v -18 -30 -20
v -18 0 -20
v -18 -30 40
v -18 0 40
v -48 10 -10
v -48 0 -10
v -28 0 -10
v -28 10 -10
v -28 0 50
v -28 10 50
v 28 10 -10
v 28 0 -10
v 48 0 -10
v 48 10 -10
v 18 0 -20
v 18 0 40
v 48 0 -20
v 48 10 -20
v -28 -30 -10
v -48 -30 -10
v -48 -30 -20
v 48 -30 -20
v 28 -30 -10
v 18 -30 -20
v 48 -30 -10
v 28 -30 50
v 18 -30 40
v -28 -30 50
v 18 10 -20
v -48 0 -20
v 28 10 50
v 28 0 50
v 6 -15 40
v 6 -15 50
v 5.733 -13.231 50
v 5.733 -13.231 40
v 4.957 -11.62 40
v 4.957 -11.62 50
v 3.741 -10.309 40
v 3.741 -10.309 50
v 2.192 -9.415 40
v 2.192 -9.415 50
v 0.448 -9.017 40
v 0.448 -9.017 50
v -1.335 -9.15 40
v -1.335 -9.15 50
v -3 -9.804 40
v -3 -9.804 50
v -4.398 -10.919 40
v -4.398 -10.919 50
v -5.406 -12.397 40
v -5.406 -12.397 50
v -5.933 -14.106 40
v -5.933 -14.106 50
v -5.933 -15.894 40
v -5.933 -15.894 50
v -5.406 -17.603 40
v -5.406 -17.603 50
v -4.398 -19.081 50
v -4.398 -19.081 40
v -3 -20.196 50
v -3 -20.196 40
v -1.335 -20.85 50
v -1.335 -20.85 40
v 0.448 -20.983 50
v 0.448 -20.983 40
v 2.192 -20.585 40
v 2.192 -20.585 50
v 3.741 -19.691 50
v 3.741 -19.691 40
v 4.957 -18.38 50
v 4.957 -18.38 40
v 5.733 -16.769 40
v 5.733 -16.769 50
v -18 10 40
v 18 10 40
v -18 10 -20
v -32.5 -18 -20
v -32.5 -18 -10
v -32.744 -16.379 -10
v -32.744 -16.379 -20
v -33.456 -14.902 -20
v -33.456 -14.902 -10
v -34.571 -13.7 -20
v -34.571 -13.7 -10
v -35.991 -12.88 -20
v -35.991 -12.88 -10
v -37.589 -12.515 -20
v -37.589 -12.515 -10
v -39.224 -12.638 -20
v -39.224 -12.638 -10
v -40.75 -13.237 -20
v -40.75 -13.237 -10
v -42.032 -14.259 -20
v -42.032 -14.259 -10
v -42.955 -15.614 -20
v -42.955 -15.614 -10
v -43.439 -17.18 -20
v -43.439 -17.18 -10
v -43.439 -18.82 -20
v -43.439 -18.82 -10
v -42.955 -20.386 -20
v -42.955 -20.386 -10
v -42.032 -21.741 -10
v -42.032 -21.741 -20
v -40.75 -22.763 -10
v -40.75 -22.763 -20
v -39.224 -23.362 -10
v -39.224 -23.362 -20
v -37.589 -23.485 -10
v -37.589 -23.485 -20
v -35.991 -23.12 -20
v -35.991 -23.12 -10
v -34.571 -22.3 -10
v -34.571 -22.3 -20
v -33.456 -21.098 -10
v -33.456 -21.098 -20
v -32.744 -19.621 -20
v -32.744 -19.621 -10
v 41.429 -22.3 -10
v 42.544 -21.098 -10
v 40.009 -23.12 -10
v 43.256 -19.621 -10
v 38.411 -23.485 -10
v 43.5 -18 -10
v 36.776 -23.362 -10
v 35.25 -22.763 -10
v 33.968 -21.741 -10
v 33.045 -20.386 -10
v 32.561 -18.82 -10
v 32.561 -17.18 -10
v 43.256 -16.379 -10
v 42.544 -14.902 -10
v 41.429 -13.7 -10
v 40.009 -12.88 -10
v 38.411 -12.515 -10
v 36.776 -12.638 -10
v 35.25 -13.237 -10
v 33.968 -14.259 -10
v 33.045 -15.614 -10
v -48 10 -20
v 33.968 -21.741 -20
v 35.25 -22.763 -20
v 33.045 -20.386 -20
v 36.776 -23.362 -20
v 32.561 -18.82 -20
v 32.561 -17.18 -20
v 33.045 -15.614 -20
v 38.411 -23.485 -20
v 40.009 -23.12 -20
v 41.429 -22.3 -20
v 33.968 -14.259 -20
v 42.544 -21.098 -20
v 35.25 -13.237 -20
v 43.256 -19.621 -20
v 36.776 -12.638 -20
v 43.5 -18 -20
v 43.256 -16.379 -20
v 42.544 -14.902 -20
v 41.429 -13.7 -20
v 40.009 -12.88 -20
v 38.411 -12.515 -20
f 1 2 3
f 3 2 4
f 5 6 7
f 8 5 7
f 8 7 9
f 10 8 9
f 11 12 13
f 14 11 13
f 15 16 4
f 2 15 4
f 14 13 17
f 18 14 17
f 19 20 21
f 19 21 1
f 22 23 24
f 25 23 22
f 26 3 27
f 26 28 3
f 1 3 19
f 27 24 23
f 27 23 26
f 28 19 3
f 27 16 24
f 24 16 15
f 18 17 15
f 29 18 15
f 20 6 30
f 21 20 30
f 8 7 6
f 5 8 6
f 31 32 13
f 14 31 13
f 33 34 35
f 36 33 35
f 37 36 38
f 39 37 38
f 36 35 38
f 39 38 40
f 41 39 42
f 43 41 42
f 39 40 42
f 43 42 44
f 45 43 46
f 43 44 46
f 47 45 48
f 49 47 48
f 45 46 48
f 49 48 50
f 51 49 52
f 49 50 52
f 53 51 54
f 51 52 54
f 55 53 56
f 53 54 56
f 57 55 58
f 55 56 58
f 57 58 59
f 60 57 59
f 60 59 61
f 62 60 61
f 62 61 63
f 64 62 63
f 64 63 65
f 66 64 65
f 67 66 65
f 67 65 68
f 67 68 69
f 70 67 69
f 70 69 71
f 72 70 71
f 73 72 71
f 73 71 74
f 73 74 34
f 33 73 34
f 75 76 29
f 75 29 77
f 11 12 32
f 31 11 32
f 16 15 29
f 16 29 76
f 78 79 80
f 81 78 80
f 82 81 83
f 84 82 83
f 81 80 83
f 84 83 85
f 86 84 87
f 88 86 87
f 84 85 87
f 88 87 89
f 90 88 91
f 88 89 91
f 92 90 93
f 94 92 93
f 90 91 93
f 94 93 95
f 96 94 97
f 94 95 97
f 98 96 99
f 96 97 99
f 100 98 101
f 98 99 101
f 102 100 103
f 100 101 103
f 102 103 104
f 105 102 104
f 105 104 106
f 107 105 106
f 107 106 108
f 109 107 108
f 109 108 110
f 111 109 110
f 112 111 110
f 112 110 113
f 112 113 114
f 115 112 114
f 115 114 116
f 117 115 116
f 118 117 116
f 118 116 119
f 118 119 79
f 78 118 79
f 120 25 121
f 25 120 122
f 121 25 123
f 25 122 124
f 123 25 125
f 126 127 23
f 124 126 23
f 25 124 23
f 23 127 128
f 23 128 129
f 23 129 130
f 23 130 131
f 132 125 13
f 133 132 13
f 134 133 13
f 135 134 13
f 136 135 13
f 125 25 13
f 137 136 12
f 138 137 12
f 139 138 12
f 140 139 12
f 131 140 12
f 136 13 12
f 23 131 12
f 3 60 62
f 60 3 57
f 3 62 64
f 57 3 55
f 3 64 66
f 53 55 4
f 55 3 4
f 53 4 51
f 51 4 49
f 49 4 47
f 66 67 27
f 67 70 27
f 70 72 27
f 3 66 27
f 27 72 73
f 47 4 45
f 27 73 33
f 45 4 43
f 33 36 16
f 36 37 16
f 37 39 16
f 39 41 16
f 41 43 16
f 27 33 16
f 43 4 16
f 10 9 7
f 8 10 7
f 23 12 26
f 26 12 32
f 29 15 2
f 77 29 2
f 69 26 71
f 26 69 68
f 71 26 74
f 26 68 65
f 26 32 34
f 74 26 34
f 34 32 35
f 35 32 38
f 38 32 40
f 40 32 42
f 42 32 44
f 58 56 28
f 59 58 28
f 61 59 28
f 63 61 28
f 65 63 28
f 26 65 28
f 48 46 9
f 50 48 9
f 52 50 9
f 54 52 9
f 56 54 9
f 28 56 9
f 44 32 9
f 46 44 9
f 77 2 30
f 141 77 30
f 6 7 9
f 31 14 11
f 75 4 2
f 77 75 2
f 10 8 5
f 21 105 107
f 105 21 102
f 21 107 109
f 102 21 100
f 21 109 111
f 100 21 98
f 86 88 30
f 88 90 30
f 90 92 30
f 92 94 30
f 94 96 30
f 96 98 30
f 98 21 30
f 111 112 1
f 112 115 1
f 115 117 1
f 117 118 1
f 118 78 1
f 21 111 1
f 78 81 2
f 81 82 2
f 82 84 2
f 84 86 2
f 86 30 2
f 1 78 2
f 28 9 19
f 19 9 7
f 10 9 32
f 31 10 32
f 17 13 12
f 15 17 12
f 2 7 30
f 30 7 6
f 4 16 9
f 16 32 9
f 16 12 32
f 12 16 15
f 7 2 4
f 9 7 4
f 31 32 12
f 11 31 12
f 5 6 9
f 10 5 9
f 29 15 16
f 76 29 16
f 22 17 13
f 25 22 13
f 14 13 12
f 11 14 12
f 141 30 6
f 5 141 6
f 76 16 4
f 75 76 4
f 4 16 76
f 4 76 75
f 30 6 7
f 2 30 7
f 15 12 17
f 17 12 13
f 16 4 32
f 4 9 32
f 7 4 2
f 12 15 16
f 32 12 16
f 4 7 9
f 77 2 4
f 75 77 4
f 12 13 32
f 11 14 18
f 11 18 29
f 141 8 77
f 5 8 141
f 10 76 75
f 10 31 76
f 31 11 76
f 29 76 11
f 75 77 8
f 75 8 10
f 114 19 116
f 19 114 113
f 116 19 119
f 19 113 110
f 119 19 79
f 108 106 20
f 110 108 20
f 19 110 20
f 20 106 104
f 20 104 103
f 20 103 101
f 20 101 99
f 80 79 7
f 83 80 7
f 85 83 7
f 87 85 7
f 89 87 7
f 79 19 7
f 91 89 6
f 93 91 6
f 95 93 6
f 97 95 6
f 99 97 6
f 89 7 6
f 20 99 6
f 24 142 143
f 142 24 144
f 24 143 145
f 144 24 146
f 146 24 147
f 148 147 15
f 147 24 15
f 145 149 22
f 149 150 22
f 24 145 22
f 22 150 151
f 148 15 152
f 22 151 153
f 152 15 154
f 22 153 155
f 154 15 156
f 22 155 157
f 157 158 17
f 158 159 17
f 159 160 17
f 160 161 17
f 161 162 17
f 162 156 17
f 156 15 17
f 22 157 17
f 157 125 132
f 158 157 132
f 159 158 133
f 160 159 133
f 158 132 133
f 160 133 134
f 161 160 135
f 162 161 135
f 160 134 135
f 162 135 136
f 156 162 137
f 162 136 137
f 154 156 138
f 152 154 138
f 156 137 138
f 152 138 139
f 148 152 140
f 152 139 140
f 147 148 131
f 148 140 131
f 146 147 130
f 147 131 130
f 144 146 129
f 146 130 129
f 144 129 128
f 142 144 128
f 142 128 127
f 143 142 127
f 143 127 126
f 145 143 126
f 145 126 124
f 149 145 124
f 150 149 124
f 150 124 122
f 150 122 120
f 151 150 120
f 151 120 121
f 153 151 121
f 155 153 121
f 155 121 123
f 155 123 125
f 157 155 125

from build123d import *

# Parameters (mm, degrees)
F1_DEPTH  = 30
F3_DEPTH  = 10
F4_W      = 36
F4_H      = 60
F5_DEPTH  = 10
F6_R      = 5.5
F7_DEPTH  = 25
F9_DEPTH  = 10
F10_R     = 5.5
F11_DEPTH = 25
F12_R     = 6
F13_DEPTH = 25


with BuildPart() as f1:
    # F0 (on Front) → F1 (new body)
    with BuildSketch(Plane.XZ):
        Polygon((-28, -10), (-48, -10), (-48, -20), (-18, -20), (-18, 40), (18, 40), (18, -20), (48, -20), (48, -10), (28, -10), (28, 50), (-28, 50), align=None)
    extrude(amount=F1_DEPTH)

    # F2 (on face) → F3 (join)
    with BuildSketch(Plane(origin=(0, 0, 0), x_dir=(-1, 0, 0), z_dir=(0, 1, 0))):
        Polygon((-28, -10), (-28, 50), (-48, -10), align=None)
        Polygon((48, -10), (28, 50), (28, -10), align=None)
    extrude(amount=F3_DEPTH)

    # F6 (on face) → F7 (cut)
    with BuildSketch(Plane.XY.offset(-10)):
        with Locations((-38, -18)):
            Circle(F6_R)
    extrude(amount=-F7_DEPTH, mode=Mode.SUBTRACT)

    # F10 (on face) → F11 (cut)
    with BuildSketch(Plane.XY.offset(-10)):
        with Locations((38, -18)):
            Circle(F10_R)
    extrude(amount=-F11_DEPTH, mode=Mode.SUBTRACT)

    # F12 (on face) → F13 (cut)
    with BuildSketch(Plane.XY.offset(50)):
        with Locations((0, -15)):
            Circle(F12_R)
    extrude(amount=-F13_DEPTH, mode=Mode.SUBTRACT)


with BuildPart() as f5:
    # F4 (on face) → F5 (new body)
    with BuildSketch(Plane(origin=(0, 0, 0), x_dir=(-1, 0, 0), z_dir=(0, 1, 0))):
        with Locations((0, 10)):
            Rectangle(F4_W, F4_H)
    extrude(amount=F5_DEPTH)


with BuildPart() as f9:
    # F8 (on face) → F9 (new body)
    with BuildSketch(Plane(origin=(0, 0, 0), x_dir=(-1, 0, 0), z_dir=(0, 1, 0))):
        Polygon((28, 50), (-28, 50), (-28, -10), (-48, -10), (-48, -20), (-18, -20), (-18, 40), (18, 40), (18, -20), (48, -20), (48, -10), (28, -10), align=None)
    extrude(amount=F9_DEPTH)


solid = Compound([f1.part, f5.part, f9.part])
